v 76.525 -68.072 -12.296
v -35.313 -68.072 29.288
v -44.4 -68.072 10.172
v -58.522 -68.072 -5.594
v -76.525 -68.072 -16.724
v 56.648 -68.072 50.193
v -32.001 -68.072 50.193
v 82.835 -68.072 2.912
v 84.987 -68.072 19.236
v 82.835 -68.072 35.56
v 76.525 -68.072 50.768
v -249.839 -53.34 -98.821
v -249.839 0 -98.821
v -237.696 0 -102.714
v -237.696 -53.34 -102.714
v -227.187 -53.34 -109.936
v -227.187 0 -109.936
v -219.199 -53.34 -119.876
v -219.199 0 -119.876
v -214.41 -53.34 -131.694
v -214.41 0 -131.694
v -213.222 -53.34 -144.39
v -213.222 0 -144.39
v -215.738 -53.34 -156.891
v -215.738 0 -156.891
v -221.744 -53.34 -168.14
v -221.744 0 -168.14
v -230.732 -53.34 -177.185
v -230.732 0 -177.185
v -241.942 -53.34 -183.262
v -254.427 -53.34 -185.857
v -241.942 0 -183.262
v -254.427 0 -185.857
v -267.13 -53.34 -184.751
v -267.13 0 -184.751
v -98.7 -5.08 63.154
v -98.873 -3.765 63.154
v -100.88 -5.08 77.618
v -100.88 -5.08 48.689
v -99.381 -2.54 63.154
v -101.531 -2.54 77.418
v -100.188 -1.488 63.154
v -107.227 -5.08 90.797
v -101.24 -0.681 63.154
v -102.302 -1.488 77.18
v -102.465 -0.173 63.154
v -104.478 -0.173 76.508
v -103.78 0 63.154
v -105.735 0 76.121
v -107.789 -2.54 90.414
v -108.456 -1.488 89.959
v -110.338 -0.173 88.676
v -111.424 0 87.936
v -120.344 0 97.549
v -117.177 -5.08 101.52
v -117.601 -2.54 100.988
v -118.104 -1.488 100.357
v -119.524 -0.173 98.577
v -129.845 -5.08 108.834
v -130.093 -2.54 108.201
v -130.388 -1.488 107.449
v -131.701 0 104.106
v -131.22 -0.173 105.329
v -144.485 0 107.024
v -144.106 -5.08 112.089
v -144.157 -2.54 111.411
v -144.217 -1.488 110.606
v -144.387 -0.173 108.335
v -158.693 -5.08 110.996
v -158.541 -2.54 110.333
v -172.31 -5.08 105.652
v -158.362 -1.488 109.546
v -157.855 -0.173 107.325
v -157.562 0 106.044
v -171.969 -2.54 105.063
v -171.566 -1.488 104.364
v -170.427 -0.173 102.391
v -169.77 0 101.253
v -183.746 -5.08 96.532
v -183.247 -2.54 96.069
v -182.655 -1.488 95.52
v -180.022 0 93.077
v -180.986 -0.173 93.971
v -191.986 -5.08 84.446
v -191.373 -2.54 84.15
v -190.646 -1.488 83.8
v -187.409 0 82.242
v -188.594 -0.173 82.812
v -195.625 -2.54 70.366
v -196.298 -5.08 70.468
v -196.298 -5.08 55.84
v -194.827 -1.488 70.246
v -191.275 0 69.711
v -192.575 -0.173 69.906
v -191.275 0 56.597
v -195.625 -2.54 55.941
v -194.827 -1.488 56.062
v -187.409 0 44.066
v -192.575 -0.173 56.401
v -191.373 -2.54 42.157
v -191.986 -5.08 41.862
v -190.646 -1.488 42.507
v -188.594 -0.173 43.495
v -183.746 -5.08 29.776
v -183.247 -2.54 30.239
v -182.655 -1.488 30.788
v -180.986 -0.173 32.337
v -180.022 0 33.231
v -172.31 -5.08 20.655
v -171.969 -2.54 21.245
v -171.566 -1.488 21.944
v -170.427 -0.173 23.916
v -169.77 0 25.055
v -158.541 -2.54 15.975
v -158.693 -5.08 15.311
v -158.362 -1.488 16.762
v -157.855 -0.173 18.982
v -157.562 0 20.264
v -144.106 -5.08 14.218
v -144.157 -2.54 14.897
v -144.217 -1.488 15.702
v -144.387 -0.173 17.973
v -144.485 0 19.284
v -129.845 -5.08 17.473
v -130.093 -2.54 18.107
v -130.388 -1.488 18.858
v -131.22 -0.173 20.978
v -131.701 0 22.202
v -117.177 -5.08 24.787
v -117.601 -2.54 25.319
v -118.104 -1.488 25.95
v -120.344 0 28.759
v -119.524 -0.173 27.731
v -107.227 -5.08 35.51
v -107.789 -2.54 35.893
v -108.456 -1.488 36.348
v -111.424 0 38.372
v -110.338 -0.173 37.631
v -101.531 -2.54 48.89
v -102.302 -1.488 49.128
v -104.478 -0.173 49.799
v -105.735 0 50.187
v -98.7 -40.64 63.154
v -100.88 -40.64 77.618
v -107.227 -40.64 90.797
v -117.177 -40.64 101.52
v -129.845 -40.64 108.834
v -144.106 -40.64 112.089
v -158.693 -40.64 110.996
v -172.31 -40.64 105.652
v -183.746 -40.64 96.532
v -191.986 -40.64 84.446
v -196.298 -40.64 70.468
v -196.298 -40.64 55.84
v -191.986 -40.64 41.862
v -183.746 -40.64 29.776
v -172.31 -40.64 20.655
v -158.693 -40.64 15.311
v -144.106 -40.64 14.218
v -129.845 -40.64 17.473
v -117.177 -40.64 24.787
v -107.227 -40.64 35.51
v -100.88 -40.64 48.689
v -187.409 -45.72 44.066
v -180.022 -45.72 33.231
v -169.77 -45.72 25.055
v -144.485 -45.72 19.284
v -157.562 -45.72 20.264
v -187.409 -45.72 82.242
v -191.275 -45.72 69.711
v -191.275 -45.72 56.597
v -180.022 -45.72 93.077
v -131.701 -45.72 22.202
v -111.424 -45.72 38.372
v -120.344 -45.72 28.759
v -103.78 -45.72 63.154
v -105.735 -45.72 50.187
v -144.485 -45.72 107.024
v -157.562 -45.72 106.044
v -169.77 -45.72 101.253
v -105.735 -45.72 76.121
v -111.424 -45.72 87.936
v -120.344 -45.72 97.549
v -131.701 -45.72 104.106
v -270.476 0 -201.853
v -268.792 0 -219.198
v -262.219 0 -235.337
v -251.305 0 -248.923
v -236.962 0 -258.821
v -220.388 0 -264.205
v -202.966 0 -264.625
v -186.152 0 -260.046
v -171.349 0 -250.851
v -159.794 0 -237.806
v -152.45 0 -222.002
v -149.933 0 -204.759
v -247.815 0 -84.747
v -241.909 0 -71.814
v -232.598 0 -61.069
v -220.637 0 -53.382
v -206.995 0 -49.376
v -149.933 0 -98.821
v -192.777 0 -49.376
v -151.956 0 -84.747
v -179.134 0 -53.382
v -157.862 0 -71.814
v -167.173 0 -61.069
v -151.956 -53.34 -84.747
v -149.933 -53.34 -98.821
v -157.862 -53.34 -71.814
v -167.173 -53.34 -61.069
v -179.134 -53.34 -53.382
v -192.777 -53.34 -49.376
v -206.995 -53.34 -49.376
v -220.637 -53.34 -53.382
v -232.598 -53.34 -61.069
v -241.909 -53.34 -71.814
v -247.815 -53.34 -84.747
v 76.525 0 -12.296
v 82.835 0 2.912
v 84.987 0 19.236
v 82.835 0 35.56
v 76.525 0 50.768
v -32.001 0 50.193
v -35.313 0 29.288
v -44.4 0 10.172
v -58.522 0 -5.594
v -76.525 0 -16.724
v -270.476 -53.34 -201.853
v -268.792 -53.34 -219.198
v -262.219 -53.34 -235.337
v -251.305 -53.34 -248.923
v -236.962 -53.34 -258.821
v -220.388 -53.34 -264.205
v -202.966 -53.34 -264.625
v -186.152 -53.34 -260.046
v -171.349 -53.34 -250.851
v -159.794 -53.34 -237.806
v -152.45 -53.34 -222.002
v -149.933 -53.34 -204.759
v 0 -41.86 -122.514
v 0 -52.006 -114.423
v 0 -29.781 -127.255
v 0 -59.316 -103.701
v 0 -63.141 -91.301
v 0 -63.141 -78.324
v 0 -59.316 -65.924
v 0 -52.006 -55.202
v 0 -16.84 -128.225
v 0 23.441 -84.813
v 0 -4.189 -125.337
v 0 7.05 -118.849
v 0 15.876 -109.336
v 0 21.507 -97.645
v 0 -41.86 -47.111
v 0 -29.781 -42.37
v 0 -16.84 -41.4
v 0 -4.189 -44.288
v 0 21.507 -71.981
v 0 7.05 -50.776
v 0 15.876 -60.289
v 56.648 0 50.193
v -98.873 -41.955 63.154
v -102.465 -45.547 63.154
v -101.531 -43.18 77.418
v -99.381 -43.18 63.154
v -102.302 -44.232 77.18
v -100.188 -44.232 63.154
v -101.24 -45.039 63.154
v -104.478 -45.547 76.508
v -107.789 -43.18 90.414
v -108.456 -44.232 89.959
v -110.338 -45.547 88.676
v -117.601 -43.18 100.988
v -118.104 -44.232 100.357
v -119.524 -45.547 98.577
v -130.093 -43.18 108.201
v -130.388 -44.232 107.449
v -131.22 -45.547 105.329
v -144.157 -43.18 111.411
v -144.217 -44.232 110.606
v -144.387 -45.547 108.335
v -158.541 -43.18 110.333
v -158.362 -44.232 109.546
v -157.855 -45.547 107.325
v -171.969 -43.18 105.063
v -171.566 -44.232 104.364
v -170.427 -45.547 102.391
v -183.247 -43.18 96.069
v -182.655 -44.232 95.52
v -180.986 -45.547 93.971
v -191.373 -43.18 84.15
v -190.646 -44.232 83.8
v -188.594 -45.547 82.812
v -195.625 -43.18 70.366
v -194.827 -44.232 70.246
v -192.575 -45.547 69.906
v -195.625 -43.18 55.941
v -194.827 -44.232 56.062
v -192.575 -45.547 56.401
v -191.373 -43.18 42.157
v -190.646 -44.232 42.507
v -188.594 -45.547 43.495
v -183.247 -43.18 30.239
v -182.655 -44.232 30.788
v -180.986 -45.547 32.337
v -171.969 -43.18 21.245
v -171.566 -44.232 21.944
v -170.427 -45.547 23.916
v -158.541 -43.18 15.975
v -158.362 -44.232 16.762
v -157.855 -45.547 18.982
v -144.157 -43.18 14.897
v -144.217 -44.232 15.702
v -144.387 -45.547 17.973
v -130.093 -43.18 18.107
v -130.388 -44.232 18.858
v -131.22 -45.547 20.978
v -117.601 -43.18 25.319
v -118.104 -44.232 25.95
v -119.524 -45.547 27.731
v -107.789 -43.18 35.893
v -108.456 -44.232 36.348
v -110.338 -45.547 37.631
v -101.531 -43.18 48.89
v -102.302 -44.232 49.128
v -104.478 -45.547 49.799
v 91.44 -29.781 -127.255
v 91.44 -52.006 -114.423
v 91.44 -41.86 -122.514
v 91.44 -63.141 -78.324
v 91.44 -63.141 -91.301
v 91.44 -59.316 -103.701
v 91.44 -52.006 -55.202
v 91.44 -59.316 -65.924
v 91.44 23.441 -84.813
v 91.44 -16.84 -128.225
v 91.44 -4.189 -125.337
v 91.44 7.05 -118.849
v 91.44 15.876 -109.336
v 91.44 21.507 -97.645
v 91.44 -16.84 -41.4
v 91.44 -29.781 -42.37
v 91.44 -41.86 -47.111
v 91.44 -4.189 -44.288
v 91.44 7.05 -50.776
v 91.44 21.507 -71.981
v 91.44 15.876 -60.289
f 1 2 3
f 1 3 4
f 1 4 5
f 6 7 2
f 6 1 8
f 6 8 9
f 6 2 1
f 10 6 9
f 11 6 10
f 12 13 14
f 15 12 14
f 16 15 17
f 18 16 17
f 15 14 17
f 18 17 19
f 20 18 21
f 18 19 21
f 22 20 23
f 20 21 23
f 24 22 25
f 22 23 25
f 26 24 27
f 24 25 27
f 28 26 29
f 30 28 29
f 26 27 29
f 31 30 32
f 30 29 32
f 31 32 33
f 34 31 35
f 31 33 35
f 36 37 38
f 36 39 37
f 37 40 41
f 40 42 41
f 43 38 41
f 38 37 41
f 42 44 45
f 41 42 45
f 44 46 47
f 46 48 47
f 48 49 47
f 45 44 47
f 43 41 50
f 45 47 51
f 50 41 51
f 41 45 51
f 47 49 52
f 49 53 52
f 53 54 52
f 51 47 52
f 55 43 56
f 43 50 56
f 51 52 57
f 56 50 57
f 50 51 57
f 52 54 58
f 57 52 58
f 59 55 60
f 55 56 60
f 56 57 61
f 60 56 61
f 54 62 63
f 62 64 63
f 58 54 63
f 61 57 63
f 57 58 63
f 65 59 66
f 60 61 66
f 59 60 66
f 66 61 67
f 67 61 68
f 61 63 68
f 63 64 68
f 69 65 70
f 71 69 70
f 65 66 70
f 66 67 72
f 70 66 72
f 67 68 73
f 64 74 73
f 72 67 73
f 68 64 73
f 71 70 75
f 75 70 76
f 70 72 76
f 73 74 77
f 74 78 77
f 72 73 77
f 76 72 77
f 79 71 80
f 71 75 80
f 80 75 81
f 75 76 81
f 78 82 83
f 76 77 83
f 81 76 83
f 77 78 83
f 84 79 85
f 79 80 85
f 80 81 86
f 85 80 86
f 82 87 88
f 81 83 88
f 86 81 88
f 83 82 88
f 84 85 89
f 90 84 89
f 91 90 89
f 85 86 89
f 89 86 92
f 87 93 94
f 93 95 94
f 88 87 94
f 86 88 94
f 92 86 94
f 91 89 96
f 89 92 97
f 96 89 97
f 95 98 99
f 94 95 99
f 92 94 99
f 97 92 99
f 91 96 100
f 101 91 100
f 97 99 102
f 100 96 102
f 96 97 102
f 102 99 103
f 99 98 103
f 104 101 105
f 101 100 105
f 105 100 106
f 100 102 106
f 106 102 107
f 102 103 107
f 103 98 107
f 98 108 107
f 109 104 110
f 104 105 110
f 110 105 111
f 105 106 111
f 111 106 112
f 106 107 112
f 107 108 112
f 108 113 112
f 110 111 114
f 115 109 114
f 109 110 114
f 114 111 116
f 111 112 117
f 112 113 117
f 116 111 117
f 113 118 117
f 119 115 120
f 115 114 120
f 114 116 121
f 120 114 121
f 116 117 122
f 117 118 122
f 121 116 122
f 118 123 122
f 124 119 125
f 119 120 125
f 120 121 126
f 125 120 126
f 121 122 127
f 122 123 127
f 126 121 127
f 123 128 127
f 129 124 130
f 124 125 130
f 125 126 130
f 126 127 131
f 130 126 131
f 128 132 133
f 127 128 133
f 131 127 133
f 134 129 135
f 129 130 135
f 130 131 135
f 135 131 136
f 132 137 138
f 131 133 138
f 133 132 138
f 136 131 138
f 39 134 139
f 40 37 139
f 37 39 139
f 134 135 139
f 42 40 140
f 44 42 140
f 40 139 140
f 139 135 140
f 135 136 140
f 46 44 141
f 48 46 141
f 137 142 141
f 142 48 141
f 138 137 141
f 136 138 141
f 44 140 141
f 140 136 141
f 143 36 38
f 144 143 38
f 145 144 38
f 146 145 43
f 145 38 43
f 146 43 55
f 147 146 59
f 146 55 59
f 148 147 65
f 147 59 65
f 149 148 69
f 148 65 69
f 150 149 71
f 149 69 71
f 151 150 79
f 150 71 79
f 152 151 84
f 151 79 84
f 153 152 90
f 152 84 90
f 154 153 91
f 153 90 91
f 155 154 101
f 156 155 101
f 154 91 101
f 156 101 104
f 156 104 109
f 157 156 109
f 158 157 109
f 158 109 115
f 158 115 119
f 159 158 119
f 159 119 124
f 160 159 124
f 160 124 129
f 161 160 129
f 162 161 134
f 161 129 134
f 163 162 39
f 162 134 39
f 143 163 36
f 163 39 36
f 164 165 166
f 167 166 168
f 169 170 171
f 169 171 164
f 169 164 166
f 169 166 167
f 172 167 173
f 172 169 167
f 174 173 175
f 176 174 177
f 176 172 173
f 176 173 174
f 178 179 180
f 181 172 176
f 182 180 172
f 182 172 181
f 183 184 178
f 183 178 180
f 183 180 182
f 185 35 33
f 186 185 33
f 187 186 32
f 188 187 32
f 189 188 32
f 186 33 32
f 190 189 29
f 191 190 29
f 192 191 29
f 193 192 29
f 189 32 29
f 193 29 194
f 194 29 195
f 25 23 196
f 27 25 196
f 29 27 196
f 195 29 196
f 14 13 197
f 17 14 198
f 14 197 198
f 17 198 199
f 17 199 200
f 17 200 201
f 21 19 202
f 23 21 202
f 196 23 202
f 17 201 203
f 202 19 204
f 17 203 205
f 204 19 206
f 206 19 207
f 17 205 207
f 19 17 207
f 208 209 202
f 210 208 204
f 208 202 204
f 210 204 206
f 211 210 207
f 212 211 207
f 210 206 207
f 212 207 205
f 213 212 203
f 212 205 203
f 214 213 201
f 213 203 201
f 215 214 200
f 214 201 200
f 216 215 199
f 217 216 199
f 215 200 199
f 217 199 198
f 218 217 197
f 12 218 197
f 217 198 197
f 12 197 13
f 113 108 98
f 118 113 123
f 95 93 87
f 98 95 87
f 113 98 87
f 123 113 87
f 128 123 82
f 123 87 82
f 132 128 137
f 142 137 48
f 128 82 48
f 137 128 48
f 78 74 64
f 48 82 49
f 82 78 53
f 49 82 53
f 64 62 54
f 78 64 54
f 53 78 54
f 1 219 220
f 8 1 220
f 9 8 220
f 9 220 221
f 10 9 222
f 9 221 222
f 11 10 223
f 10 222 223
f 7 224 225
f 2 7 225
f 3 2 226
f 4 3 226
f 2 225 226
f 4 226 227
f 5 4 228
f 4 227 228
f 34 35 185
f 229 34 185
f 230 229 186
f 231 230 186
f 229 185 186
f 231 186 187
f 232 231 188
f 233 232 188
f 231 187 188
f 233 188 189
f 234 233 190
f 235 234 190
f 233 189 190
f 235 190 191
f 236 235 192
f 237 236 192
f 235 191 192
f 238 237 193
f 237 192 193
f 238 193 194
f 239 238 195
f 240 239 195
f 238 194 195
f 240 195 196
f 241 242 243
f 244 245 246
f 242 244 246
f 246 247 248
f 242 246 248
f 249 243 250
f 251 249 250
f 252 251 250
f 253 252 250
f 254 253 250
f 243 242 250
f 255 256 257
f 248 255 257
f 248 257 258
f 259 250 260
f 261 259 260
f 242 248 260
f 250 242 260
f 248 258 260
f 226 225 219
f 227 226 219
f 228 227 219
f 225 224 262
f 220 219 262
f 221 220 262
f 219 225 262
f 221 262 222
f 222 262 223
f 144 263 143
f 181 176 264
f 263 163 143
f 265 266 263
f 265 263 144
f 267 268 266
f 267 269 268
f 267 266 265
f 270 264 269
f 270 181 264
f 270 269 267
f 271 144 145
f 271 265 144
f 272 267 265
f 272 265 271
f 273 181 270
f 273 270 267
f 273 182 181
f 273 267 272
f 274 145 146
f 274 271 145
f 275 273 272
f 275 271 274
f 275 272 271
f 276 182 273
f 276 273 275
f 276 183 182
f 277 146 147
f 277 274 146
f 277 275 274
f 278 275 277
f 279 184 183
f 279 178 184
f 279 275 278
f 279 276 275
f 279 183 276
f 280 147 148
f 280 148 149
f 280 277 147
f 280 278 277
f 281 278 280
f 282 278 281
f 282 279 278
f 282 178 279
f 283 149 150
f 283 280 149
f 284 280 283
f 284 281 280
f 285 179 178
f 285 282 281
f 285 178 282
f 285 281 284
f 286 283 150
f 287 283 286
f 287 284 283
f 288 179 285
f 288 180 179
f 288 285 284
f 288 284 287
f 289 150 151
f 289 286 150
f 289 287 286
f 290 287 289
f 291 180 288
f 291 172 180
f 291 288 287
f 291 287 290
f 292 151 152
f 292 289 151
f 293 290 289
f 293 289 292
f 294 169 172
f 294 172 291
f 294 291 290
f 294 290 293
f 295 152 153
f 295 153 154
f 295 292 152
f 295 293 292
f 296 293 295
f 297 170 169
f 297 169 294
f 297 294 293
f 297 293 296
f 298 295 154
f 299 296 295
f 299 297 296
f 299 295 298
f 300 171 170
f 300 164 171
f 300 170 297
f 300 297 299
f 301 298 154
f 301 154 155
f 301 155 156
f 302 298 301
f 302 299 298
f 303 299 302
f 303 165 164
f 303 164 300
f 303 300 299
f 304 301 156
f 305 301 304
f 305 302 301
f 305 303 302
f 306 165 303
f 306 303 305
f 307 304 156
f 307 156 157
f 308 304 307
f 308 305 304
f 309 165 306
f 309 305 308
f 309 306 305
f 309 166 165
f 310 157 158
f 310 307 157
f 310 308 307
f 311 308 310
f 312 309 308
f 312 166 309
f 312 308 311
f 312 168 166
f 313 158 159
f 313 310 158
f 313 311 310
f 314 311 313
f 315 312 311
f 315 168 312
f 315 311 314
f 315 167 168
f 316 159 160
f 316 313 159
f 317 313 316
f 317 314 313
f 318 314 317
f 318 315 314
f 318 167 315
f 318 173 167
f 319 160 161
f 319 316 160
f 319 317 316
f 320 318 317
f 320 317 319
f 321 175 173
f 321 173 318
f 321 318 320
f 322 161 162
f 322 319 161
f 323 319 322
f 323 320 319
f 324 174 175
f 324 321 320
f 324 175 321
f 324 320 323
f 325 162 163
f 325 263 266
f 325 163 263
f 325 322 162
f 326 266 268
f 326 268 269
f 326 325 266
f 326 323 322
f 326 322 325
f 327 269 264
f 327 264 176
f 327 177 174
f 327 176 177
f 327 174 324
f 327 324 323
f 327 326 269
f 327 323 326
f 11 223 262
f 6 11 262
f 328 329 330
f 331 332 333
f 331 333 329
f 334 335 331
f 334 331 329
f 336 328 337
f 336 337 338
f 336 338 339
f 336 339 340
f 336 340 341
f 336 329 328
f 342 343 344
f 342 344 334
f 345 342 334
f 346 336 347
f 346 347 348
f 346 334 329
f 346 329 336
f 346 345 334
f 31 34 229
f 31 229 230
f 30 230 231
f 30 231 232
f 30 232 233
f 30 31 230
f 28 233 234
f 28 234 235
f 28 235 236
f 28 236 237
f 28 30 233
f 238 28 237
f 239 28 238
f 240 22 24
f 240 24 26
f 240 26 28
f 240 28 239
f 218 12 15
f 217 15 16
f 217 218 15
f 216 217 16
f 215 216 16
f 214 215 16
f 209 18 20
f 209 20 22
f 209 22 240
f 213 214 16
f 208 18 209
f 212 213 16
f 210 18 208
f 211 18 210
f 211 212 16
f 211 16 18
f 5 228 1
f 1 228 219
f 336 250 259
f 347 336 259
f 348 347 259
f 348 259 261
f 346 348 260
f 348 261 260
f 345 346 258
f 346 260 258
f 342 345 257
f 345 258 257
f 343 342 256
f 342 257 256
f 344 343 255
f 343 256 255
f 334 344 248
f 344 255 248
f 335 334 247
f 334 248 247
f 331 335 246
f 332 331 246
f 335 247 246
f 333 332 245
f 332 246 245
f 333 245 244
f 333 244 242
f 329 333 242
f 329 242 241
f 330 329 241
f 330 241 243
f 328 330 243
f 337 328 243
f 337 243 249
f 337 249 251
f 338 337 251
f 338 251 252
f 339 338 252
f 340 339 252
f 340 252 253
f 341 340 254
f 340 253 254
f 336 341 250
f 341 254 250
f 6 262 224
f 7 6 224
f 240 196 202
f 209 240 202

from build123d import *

# Parameters (mm, degrees)
F1_DEPTH = 68.072
F2_R     = 49.072963
F3_DEPTH = 45.72
F4_R     = 5.08
F5_R     = 5.08
F6_R     = 43.534048
F7_DEPTH = 91.44
F9_DEPTH = 53.34


with BuildPart() as f1:
    # F0 (on Front) → F1 (new body)
    with BuildSketch(Plane.XZ):
        with BuildLine():
            ThreePointArc((-32.001413, 50.193176), (-44.400376, 10.172182), (-76.525114, -16.724201))
            Line((-76.525114, -16.724201), (76.525114, -12.295715))
            ThreePointArc((76.525114, -12.295715), (84.98728, 19.236295), (76.525114, 50.768304))
            Line((76.525114, 50.768304), (56.648456, 50.193176))
            Line((56.648456, 50.193176), (-32.001413, 50.193176))
        make_face()
    extrude(amount=F1_DEPTH)


with BuildPart() as f3:
    # F2 (on Front) → F3 (new body)
    with BuildSketch(Plane.XZ):
        with Locations((-147.773027, 63.153692)):
            Circle(F2_R)
    extrude(amount=F3_DEPTH)

    # F4
    f4_edges = [f3.edges().sort_by_distance(p)[0] for p in [
        (-196.84599, -45.72, 63.153692),
    ]]
    fillet(f4_edges, radius=F4_R)

    # F5
    f5_edges = [f3.edges().sort_by_distance(p)[0] for p in [
        (-196.84599, 0, 63.153692),
    ]]
    fillet(f5_edges, radius=F5_R)


with BuildPart() as f7:
    # F6 (on Right) → F7 (new body)
    with BuildSketch(Plane.YZ):
        with Locations((-20.093309, -84.812745)):
            Circle(F6_R)
    extrude(amount=F7_DEPTH)


with BuildPart() as f9:
    # F8 (on Front) → F9 (new body)
    with BuildSketch(Plane.XZ):
        with BuildLine():
            Line((-149.932593, -204.758555), (-149.932593, -98.820679))
            ThreePointArc((-149.932593, -98.820679), (-199.885726, -48.867546), (-249.838859, -98.820679))
            ThreePointArc((-249.838859, -98.820679), (-214.023228, -150.732521), (-267.130345, -184.750646))
            ThreePointArc((-267.130345, -184.750646), (-220.388026, -264.205231), (-149.932593, -204.758555))
        make_face()
    extrude(amount=F9_DEPTH)


solid = Compound([f1.part, f3.part, f7.part, f9.part])
